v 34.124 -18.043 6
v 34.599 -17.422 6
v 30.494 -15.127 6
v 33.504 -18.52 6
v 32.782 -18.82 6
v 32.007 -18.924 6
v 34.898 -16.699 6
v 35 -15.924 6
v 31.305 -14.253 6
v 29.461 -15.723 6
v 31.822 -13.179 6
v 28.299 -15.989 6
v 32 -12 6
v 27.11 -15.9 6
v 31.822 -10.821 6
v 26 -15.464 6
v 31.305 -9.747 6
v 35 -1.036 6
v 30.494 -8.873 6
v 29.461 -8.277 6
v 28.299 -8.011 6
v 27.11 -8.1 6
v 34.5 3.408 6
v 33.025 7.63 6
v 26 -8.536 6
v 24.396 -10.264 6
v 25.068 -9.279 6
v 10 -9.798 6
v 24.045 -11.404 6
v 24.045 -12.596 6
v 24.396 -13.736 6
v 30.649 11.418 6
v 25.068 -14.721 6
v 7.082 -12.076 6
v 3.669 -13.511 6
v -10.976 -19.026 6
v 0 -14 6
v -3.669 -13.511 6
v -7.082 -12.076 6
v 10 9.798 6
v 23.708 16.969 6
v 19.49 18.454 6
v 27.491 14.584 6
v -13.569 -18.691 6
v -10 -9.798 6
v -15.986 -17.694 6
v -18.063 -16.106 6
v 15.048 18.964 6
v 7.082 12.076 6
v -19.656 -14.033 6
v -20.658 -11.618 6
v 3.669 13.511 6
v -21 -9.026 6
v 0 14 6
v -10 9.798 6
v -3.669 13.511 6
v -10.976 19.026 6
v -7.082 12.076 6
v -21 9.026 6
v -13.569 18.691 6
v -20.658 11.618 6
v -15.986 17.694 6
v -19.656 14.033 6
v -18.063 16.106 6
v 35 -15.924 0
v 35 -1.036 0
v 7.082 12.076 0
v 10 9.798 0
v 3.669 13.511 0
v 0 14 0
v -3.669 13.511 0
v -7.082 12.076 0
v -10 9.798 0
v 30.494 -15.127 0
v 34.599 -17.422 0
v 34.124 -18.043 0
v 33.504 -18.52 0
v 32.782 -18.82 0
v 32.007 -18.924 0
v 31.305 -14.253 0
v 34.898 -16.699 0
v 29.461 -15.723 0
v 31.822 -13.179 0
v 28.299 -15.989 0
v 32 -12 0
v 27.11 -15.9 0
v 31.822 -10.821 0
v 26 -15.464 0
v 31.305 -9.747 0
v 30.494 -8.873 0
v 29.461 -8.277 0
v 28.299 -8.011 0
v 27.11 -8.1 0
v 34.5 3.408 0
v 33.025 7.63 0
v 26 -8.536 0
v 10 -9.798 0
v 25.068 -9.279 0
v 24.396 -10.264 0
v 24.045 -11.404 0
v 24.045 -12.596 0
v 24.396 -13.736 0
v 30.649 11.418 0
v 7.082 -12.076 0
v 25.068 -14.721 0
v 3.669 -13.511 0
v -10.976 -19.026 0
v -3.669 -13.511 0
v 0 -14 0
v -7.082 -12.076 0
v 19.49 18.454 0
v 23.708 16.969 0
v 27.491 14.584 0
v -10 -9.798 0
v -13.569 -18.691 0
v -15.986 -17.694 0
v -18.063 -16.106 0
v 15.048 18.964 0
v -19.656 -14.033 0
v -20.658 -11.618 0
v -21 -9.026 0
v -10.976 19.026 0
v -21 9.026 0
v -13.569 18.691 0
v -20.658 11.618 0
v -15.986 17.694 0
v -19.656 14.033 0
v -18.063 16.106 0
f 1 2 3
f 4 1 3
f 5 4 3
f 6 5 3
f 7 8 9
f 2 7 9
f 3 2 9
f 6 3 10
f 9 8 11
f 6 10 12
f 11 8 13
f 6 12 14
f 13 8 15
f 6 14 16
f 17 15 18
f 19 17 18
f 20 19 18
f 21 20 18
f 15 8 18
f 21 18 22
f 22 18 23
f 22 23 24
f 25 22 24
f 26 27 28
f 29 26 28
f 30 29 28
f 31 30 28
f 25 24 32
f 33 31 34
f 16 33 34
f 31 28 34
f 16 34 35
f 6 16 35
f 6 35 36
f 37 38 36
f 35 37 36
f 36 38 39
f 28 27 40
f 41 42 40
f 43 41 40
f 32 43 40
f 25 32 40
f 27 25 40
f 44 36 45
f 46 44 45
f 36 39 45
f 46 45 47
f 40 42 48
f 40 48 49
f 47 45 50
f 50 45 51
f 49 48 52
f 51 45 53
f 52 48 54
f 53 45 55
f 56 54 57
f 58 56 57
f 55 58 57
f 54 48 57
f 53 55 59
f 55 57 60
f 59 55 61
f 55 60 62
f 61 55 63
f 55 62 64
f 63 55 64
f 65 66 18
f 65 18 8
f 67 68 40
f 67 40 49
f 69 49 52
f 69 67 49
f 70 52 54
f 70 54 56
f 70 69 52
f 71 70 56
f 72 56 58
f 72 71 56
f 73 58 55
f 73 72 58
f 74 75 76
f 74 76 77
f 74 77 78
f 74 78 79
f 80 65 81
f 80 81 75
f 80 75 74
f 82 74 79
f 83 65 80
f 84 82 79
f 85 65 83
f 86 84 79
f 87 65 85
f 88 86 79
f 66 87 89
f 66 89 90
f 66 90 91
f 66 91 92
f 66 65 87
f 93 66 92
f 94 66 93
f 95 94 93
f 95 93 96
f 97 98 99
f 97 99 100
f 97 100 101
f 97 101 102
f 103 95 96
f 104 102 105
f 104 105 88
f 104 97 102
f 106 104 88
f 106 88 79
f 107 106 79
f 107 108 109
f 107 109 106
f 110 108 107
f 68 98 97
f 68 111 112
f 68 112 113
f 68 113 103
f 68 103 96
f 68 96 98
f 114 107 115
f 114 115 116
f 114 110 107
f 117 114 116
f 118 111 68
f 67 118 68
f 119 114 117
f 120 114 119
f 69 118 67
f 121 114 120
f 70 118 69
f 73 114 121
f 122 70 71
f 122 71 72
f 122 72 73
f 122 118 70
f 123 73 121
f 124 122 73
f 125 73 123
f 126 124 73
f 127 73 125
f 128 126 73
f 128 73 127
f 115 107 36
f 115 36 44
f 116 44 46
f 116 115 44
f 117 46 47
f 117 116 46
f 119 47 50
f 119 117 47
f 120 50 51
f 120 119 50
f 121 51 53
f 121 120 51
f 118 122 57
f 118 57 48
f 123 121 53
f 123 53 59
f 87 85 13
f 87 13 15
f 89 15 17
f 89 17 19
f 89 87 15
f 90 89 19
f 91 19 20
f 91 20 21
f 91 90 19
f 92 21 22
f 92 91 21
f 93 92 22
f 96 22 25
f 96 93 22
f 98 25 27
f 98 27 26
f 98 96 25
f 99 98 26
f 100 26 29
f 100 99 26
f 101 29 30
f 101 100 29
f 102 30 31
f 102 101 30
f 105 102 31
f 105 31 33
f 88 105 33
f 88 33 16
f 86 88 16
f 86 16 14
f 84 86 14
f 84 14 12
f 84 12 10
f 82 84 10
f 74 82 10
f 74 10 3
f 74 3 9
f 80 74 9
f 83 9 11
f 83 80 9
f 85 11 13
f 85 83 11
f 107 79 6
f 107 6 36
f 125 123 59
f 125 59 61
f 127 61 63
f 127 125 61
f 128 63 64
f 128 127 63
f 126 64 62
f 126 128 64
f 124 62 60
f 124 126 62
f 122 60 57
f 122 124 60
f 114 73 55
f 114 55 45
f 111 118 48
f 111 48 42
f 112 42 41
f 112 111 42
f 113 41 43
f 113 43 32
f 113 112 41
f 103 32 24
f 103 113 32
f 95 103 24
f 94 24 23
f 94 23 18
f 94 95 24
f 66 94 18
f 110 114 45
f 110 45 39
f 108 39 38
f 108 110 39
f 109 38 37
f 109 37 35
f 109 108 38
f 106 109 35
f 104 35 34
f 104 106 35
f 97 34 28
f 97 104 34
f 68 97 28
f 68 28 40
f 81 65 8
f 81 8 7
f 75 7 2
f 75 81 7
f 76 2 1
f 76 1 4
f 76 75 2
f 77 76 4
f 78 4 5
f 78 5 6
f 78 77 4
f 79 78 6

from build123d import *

# Parameters (mm, degrees)
SKETCH1_R           = 4
BOSS_EXTRUDE1_DEPTH = 6


with BuildPart() as part:
    # Sketch1 → Boss-Extrude1 (new body)
    with BuildSketch(Plane.XY):
        with BuildLine():
            Line((32.00713516, -18.923928181), (-10.976216134, -19.026159499))
            ThreePointArc((-10.976216134, -19.026159499), (-18.062653939, -16.105659467), (-21, -9.026187783))
            Line((-21, -9.026187783), (-21, 9.026187783))
            ThreePointArc((-21, 9.026187783), (-18.062653939, 16.105659467), (-10.976216134, 19.026159499))
            Line((-10.976216134, 19.026159499), (15.047567733, 18.964264704))
            ThreePointArc((15.047567733, 18.964264704), (29.158943369, 13.08962915), (35, -1.035678729))
            Line((35, -1.035678729), (35, -15.923936666))
            ThreePointArc((35, -15.923936666), (34.123841505, -18.042732848), (32.00713516, -18.923928181))
        make_face()
        with Locations((28, -12)):
            Circle(SKETCH1_R, mode=Mode.SUBTRACT)
        with BuildLine():
            Line((-10, 9.797958971), (-10, -9.797958971))
            ThreePointArc((-10, -9.797958971), (0, -14), (10, -9.797958971))
            Line((10, -9.797958971), (10, 9.797958971))
            ThreePointArc((10, 9.797958971), (0, 14), (-10, 9.797958971))
        make_face(mode=Mode.SUBTRACT)
    extrude(amount=BOSS_EXTRUDE1_DEPTH)


solid = part.part
